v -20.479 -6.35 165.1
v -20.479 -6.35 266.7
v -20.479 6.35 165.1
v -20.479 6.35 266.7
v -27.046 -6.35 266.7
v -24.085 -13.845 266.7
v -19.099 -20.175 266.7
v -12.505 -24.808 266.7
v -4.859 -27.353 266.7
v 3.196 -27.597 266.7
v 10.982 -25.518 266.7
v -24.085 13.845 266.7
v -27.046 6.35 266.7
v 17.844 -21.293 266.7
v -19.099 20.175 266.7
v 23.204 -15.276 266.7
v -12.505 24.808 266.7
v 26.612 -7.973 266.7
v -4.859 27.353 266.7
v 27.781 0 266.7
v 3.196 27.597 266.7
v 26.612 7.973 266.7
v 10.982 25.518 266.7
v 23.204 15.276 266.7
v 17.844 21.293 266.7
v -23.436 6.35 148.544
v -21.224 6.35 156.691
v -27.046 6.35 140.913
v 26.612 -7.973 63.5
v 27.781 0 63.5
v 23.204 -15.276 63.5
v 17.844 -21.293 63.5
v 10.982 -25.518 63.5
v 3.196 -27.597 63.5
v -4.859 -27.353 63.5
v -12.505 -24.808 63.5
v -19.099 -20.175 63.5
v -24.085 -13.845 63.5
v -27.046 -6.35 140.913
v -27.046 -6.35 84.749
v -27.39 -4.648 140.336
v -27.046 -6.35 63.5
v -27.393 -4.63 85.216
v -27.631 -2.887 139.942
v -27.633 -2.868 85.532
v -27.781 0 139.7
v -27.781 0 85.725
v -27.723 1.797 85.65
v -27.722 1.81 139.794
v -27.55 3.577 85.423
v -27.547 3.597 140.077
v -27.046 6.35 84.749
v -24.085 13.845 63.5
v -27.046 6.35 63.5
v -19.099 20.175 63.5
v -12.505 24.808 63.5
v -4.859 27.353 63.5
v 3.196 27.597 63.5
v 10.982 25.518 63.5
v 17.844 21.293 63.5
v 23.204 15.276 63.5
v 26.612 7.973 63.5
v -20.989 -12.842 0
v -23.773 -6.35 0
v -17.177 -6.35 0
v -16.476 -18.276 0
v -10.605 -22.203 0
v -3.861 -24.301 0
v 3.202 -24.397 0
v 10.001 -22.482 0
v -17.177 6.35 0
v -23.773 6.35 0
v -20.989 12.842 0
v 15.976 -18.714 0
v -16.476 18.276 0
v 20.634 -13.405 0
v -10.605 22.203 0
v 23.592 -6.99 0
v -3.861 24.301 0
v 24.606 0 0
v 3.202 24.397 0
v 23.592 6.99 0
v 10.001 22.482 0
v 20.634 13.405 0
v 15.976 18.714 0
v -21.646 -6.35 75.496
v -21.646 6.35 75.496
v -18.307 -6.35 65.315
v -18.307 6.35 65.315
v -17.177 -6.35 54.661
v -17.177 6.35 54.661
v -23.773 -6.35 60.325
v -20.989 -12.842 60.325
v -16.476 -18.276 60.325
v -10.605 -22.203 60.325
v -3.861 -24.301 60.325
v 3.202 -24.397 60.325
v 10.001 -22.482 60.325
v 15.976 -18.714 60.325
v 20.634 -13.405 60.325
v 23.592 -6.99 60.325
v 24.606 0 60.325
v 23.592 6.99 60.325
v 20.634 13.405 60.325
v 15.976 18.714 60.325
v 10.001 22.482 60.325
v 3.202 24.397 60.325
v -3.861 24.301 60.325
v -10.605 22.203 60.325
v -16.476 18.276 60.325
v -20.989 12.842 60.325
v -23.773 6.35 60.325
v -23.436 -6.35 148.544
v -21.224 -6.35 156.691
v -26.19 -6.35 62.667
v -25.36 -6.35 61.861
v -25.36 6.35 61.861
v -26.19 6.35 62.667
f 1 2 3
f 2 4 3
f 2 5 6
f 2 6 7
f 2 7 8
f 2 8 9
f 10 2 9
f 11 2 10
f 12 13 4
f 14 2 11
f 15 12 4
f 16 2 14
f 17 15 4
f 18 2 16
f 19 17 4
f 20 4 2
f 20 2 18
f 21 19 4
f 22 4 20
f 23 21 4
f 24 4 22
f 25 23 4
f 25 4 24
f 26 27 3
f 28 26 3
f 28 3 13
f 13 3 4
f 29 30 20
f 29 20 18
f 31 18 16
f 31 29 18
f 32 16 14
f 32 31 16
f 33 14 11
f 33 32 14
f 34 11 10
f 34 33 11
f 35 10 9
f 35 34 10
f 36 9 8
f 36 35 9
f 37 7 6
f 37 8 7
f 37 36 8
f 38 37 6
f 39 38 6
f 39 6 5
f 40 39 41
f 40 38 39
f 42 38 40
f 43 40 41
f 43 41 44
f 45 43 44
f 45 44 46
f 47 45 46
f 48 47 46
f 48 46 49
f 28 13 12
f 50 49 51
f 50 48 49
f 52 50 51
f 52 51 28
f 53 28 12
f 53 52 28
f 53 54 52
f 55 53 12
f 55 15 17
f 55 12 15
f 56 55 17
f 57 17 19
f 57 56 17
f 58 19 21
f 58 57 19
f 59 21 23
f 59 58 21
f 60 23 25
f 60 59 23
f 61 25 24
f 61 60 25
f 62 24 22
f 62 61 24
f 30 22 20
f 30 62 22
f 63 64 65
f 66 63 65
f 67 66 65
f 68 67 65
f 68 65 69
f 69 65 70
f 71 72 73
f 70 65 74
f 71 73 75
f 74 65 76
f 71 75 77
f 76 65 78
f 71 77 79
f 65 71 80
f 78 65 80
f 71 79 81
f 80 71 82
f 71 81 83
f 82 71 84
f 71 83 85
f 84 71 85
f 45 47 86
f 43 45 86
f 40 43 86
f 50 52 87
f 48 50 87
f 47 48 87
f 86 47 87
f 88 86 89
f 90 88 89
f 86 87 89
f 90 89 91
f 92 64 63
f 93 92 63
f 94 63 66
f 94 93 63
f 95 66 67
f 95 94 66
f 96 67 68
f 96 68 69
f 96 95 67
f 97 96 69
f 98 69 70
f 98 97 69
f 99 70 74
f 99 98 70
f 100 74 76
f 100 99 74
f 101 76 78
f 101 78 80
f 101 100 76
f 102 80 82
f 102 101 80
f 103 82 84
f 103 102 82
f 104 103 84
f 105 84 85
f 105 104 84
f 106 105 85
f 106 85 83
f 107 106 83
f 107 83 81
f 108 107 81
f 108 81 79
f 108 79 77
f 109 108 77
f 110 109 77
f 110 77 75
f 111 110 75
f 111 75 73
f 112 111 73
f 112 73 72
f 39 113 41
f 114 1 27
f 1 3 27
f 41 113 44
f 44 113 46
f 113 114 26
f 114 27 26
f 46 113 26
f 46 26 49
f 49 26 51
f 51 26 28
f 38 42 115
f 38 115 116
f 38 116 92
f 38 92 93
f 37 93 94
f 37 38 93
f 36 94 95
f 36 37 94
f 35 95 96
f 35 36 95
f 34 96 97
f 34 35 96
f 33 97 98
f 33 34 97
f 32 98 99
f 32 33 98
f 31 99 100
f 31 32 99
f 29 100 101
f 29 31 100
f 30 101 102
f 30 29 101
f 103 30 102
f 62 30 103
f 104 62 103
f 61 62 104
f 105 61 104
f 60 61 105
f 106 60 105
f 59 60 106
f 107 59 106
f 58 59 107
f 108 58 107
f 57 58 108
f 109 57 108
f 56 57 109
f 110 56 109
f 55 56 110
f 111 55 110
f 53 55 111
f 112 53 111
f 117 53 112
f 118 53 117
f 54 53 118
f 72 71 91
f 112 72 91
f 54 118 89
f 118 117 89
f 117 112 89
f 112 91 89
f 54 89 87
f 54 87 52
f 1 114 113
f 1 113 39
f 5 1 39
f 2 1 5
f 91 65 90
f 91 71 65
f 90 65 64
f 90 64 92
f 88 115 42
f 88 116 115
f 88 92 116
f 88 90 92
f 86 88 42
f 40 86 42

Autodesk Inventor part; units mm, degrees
ref_plane "YZ Plane" through (0, 0, 0) normal (1, 0, 0) x (0, 1, 0)
ref_plane "XZ Plane" through (0, 0, 0) normal (0, 1, 0) x (-1, 0, 0)
sketch "Sketch1" plane through (0, 0, 0) normal (0, 0, 1) x (1, 0, 0)
  circle A0 centre (0, 0) radius 27.7812
  dimension "d0" = 55.5625
extrude "Extrusion1" add sketch "Sketch1" along normal blind 266.7
ref_plane "Work Plane1" through (0, 0, 0) normal (0, 1, 0) x (0, 0, 1)
sketch "Sketch2" plane through (0, 0, 0) normal (0, 1, 0) x (0, 0, 1)
  line L0 (-53.34, 0) -> (320.04, 0) projected
  line L1 (0, -24.6062) -> (60.325, -24.6062)
  line L2 (60.325, -24.6062) -> (63.5, -27.7812)
  line L3 (0, -27.7812) -> (266.7, -27.7812) projected
  line L4 (0, -24.6062) -> (0, -27.7812)
  line L5 (0, 27.7812) -> (0, -27.7812) projected
  dimension "d4" = 24.6062
  dimension "d5" = 135
  dimension "d6" = 60.325
revolve "Revolution1" cut sketch "Sketch2" angle 360 about axis through (0, 0, 0) along (0, 0, 1)
sketch "Sketch3" plane through (0, 0, 0) normal (0, 1, 0) x (0, 0, 1)
  line L0 (60.325, -24.6062) -> (0, -24.6062) projected
  line L1 (0, 24.6062) -> (0, -24.6062) projected
  line L2 (-127.1587, 0) -> (762.9525, 0) projected
  line L3 (0, -17.1768) -> (54.6612, -17.1767)
  arc A0 (85.725, -27.7812) -> (54.6612, -17.1767) centre (54.6612, -67.9767) ccw
  line L4 (60.325, 24.6062) -> (0, 24.6062) projected
  line L5 (63.5, -27.7812) -> (266.7, -27.7812) projected
  line L6 (63.5, -27.7812) -> (60.325, -24.6062)
  dimension "d8" = 50.8
  dimension "d9" = 41.783
  dimension "d10" = 85.725
extrude "Extrusion2" cut sketch "Sketch3" against normal mid plane 12.7
sketch "Sketch4" plane through (0, 0, 0) normal (0, 1, 0) x (0, 0, 1)
  line L0 (266.7, 27.7812) -> (266.7, -27.7812) projected
  line L1 (85.725, -27.7812) -> (266.7, -27.7812) projected
  line L2 (63.5, 27.7812) -> (266.7, 27.7812) projected
  line L3 (266.7, -20.4788) -> (165.1, -20.4788)
  arc A0 (165.1, -20.4788) -> (139.7, -27.7812) centre (165.1, -68.3039) ccw
  dimension "d13" = 101.6
  dimension "d14" = 127
  dimension "d15" = 48.26
extrude "Extrusion3" cut sketch "Sketch4" against normal mid plane 12.7
properties part number "shaft" material "Steel, Mild"
